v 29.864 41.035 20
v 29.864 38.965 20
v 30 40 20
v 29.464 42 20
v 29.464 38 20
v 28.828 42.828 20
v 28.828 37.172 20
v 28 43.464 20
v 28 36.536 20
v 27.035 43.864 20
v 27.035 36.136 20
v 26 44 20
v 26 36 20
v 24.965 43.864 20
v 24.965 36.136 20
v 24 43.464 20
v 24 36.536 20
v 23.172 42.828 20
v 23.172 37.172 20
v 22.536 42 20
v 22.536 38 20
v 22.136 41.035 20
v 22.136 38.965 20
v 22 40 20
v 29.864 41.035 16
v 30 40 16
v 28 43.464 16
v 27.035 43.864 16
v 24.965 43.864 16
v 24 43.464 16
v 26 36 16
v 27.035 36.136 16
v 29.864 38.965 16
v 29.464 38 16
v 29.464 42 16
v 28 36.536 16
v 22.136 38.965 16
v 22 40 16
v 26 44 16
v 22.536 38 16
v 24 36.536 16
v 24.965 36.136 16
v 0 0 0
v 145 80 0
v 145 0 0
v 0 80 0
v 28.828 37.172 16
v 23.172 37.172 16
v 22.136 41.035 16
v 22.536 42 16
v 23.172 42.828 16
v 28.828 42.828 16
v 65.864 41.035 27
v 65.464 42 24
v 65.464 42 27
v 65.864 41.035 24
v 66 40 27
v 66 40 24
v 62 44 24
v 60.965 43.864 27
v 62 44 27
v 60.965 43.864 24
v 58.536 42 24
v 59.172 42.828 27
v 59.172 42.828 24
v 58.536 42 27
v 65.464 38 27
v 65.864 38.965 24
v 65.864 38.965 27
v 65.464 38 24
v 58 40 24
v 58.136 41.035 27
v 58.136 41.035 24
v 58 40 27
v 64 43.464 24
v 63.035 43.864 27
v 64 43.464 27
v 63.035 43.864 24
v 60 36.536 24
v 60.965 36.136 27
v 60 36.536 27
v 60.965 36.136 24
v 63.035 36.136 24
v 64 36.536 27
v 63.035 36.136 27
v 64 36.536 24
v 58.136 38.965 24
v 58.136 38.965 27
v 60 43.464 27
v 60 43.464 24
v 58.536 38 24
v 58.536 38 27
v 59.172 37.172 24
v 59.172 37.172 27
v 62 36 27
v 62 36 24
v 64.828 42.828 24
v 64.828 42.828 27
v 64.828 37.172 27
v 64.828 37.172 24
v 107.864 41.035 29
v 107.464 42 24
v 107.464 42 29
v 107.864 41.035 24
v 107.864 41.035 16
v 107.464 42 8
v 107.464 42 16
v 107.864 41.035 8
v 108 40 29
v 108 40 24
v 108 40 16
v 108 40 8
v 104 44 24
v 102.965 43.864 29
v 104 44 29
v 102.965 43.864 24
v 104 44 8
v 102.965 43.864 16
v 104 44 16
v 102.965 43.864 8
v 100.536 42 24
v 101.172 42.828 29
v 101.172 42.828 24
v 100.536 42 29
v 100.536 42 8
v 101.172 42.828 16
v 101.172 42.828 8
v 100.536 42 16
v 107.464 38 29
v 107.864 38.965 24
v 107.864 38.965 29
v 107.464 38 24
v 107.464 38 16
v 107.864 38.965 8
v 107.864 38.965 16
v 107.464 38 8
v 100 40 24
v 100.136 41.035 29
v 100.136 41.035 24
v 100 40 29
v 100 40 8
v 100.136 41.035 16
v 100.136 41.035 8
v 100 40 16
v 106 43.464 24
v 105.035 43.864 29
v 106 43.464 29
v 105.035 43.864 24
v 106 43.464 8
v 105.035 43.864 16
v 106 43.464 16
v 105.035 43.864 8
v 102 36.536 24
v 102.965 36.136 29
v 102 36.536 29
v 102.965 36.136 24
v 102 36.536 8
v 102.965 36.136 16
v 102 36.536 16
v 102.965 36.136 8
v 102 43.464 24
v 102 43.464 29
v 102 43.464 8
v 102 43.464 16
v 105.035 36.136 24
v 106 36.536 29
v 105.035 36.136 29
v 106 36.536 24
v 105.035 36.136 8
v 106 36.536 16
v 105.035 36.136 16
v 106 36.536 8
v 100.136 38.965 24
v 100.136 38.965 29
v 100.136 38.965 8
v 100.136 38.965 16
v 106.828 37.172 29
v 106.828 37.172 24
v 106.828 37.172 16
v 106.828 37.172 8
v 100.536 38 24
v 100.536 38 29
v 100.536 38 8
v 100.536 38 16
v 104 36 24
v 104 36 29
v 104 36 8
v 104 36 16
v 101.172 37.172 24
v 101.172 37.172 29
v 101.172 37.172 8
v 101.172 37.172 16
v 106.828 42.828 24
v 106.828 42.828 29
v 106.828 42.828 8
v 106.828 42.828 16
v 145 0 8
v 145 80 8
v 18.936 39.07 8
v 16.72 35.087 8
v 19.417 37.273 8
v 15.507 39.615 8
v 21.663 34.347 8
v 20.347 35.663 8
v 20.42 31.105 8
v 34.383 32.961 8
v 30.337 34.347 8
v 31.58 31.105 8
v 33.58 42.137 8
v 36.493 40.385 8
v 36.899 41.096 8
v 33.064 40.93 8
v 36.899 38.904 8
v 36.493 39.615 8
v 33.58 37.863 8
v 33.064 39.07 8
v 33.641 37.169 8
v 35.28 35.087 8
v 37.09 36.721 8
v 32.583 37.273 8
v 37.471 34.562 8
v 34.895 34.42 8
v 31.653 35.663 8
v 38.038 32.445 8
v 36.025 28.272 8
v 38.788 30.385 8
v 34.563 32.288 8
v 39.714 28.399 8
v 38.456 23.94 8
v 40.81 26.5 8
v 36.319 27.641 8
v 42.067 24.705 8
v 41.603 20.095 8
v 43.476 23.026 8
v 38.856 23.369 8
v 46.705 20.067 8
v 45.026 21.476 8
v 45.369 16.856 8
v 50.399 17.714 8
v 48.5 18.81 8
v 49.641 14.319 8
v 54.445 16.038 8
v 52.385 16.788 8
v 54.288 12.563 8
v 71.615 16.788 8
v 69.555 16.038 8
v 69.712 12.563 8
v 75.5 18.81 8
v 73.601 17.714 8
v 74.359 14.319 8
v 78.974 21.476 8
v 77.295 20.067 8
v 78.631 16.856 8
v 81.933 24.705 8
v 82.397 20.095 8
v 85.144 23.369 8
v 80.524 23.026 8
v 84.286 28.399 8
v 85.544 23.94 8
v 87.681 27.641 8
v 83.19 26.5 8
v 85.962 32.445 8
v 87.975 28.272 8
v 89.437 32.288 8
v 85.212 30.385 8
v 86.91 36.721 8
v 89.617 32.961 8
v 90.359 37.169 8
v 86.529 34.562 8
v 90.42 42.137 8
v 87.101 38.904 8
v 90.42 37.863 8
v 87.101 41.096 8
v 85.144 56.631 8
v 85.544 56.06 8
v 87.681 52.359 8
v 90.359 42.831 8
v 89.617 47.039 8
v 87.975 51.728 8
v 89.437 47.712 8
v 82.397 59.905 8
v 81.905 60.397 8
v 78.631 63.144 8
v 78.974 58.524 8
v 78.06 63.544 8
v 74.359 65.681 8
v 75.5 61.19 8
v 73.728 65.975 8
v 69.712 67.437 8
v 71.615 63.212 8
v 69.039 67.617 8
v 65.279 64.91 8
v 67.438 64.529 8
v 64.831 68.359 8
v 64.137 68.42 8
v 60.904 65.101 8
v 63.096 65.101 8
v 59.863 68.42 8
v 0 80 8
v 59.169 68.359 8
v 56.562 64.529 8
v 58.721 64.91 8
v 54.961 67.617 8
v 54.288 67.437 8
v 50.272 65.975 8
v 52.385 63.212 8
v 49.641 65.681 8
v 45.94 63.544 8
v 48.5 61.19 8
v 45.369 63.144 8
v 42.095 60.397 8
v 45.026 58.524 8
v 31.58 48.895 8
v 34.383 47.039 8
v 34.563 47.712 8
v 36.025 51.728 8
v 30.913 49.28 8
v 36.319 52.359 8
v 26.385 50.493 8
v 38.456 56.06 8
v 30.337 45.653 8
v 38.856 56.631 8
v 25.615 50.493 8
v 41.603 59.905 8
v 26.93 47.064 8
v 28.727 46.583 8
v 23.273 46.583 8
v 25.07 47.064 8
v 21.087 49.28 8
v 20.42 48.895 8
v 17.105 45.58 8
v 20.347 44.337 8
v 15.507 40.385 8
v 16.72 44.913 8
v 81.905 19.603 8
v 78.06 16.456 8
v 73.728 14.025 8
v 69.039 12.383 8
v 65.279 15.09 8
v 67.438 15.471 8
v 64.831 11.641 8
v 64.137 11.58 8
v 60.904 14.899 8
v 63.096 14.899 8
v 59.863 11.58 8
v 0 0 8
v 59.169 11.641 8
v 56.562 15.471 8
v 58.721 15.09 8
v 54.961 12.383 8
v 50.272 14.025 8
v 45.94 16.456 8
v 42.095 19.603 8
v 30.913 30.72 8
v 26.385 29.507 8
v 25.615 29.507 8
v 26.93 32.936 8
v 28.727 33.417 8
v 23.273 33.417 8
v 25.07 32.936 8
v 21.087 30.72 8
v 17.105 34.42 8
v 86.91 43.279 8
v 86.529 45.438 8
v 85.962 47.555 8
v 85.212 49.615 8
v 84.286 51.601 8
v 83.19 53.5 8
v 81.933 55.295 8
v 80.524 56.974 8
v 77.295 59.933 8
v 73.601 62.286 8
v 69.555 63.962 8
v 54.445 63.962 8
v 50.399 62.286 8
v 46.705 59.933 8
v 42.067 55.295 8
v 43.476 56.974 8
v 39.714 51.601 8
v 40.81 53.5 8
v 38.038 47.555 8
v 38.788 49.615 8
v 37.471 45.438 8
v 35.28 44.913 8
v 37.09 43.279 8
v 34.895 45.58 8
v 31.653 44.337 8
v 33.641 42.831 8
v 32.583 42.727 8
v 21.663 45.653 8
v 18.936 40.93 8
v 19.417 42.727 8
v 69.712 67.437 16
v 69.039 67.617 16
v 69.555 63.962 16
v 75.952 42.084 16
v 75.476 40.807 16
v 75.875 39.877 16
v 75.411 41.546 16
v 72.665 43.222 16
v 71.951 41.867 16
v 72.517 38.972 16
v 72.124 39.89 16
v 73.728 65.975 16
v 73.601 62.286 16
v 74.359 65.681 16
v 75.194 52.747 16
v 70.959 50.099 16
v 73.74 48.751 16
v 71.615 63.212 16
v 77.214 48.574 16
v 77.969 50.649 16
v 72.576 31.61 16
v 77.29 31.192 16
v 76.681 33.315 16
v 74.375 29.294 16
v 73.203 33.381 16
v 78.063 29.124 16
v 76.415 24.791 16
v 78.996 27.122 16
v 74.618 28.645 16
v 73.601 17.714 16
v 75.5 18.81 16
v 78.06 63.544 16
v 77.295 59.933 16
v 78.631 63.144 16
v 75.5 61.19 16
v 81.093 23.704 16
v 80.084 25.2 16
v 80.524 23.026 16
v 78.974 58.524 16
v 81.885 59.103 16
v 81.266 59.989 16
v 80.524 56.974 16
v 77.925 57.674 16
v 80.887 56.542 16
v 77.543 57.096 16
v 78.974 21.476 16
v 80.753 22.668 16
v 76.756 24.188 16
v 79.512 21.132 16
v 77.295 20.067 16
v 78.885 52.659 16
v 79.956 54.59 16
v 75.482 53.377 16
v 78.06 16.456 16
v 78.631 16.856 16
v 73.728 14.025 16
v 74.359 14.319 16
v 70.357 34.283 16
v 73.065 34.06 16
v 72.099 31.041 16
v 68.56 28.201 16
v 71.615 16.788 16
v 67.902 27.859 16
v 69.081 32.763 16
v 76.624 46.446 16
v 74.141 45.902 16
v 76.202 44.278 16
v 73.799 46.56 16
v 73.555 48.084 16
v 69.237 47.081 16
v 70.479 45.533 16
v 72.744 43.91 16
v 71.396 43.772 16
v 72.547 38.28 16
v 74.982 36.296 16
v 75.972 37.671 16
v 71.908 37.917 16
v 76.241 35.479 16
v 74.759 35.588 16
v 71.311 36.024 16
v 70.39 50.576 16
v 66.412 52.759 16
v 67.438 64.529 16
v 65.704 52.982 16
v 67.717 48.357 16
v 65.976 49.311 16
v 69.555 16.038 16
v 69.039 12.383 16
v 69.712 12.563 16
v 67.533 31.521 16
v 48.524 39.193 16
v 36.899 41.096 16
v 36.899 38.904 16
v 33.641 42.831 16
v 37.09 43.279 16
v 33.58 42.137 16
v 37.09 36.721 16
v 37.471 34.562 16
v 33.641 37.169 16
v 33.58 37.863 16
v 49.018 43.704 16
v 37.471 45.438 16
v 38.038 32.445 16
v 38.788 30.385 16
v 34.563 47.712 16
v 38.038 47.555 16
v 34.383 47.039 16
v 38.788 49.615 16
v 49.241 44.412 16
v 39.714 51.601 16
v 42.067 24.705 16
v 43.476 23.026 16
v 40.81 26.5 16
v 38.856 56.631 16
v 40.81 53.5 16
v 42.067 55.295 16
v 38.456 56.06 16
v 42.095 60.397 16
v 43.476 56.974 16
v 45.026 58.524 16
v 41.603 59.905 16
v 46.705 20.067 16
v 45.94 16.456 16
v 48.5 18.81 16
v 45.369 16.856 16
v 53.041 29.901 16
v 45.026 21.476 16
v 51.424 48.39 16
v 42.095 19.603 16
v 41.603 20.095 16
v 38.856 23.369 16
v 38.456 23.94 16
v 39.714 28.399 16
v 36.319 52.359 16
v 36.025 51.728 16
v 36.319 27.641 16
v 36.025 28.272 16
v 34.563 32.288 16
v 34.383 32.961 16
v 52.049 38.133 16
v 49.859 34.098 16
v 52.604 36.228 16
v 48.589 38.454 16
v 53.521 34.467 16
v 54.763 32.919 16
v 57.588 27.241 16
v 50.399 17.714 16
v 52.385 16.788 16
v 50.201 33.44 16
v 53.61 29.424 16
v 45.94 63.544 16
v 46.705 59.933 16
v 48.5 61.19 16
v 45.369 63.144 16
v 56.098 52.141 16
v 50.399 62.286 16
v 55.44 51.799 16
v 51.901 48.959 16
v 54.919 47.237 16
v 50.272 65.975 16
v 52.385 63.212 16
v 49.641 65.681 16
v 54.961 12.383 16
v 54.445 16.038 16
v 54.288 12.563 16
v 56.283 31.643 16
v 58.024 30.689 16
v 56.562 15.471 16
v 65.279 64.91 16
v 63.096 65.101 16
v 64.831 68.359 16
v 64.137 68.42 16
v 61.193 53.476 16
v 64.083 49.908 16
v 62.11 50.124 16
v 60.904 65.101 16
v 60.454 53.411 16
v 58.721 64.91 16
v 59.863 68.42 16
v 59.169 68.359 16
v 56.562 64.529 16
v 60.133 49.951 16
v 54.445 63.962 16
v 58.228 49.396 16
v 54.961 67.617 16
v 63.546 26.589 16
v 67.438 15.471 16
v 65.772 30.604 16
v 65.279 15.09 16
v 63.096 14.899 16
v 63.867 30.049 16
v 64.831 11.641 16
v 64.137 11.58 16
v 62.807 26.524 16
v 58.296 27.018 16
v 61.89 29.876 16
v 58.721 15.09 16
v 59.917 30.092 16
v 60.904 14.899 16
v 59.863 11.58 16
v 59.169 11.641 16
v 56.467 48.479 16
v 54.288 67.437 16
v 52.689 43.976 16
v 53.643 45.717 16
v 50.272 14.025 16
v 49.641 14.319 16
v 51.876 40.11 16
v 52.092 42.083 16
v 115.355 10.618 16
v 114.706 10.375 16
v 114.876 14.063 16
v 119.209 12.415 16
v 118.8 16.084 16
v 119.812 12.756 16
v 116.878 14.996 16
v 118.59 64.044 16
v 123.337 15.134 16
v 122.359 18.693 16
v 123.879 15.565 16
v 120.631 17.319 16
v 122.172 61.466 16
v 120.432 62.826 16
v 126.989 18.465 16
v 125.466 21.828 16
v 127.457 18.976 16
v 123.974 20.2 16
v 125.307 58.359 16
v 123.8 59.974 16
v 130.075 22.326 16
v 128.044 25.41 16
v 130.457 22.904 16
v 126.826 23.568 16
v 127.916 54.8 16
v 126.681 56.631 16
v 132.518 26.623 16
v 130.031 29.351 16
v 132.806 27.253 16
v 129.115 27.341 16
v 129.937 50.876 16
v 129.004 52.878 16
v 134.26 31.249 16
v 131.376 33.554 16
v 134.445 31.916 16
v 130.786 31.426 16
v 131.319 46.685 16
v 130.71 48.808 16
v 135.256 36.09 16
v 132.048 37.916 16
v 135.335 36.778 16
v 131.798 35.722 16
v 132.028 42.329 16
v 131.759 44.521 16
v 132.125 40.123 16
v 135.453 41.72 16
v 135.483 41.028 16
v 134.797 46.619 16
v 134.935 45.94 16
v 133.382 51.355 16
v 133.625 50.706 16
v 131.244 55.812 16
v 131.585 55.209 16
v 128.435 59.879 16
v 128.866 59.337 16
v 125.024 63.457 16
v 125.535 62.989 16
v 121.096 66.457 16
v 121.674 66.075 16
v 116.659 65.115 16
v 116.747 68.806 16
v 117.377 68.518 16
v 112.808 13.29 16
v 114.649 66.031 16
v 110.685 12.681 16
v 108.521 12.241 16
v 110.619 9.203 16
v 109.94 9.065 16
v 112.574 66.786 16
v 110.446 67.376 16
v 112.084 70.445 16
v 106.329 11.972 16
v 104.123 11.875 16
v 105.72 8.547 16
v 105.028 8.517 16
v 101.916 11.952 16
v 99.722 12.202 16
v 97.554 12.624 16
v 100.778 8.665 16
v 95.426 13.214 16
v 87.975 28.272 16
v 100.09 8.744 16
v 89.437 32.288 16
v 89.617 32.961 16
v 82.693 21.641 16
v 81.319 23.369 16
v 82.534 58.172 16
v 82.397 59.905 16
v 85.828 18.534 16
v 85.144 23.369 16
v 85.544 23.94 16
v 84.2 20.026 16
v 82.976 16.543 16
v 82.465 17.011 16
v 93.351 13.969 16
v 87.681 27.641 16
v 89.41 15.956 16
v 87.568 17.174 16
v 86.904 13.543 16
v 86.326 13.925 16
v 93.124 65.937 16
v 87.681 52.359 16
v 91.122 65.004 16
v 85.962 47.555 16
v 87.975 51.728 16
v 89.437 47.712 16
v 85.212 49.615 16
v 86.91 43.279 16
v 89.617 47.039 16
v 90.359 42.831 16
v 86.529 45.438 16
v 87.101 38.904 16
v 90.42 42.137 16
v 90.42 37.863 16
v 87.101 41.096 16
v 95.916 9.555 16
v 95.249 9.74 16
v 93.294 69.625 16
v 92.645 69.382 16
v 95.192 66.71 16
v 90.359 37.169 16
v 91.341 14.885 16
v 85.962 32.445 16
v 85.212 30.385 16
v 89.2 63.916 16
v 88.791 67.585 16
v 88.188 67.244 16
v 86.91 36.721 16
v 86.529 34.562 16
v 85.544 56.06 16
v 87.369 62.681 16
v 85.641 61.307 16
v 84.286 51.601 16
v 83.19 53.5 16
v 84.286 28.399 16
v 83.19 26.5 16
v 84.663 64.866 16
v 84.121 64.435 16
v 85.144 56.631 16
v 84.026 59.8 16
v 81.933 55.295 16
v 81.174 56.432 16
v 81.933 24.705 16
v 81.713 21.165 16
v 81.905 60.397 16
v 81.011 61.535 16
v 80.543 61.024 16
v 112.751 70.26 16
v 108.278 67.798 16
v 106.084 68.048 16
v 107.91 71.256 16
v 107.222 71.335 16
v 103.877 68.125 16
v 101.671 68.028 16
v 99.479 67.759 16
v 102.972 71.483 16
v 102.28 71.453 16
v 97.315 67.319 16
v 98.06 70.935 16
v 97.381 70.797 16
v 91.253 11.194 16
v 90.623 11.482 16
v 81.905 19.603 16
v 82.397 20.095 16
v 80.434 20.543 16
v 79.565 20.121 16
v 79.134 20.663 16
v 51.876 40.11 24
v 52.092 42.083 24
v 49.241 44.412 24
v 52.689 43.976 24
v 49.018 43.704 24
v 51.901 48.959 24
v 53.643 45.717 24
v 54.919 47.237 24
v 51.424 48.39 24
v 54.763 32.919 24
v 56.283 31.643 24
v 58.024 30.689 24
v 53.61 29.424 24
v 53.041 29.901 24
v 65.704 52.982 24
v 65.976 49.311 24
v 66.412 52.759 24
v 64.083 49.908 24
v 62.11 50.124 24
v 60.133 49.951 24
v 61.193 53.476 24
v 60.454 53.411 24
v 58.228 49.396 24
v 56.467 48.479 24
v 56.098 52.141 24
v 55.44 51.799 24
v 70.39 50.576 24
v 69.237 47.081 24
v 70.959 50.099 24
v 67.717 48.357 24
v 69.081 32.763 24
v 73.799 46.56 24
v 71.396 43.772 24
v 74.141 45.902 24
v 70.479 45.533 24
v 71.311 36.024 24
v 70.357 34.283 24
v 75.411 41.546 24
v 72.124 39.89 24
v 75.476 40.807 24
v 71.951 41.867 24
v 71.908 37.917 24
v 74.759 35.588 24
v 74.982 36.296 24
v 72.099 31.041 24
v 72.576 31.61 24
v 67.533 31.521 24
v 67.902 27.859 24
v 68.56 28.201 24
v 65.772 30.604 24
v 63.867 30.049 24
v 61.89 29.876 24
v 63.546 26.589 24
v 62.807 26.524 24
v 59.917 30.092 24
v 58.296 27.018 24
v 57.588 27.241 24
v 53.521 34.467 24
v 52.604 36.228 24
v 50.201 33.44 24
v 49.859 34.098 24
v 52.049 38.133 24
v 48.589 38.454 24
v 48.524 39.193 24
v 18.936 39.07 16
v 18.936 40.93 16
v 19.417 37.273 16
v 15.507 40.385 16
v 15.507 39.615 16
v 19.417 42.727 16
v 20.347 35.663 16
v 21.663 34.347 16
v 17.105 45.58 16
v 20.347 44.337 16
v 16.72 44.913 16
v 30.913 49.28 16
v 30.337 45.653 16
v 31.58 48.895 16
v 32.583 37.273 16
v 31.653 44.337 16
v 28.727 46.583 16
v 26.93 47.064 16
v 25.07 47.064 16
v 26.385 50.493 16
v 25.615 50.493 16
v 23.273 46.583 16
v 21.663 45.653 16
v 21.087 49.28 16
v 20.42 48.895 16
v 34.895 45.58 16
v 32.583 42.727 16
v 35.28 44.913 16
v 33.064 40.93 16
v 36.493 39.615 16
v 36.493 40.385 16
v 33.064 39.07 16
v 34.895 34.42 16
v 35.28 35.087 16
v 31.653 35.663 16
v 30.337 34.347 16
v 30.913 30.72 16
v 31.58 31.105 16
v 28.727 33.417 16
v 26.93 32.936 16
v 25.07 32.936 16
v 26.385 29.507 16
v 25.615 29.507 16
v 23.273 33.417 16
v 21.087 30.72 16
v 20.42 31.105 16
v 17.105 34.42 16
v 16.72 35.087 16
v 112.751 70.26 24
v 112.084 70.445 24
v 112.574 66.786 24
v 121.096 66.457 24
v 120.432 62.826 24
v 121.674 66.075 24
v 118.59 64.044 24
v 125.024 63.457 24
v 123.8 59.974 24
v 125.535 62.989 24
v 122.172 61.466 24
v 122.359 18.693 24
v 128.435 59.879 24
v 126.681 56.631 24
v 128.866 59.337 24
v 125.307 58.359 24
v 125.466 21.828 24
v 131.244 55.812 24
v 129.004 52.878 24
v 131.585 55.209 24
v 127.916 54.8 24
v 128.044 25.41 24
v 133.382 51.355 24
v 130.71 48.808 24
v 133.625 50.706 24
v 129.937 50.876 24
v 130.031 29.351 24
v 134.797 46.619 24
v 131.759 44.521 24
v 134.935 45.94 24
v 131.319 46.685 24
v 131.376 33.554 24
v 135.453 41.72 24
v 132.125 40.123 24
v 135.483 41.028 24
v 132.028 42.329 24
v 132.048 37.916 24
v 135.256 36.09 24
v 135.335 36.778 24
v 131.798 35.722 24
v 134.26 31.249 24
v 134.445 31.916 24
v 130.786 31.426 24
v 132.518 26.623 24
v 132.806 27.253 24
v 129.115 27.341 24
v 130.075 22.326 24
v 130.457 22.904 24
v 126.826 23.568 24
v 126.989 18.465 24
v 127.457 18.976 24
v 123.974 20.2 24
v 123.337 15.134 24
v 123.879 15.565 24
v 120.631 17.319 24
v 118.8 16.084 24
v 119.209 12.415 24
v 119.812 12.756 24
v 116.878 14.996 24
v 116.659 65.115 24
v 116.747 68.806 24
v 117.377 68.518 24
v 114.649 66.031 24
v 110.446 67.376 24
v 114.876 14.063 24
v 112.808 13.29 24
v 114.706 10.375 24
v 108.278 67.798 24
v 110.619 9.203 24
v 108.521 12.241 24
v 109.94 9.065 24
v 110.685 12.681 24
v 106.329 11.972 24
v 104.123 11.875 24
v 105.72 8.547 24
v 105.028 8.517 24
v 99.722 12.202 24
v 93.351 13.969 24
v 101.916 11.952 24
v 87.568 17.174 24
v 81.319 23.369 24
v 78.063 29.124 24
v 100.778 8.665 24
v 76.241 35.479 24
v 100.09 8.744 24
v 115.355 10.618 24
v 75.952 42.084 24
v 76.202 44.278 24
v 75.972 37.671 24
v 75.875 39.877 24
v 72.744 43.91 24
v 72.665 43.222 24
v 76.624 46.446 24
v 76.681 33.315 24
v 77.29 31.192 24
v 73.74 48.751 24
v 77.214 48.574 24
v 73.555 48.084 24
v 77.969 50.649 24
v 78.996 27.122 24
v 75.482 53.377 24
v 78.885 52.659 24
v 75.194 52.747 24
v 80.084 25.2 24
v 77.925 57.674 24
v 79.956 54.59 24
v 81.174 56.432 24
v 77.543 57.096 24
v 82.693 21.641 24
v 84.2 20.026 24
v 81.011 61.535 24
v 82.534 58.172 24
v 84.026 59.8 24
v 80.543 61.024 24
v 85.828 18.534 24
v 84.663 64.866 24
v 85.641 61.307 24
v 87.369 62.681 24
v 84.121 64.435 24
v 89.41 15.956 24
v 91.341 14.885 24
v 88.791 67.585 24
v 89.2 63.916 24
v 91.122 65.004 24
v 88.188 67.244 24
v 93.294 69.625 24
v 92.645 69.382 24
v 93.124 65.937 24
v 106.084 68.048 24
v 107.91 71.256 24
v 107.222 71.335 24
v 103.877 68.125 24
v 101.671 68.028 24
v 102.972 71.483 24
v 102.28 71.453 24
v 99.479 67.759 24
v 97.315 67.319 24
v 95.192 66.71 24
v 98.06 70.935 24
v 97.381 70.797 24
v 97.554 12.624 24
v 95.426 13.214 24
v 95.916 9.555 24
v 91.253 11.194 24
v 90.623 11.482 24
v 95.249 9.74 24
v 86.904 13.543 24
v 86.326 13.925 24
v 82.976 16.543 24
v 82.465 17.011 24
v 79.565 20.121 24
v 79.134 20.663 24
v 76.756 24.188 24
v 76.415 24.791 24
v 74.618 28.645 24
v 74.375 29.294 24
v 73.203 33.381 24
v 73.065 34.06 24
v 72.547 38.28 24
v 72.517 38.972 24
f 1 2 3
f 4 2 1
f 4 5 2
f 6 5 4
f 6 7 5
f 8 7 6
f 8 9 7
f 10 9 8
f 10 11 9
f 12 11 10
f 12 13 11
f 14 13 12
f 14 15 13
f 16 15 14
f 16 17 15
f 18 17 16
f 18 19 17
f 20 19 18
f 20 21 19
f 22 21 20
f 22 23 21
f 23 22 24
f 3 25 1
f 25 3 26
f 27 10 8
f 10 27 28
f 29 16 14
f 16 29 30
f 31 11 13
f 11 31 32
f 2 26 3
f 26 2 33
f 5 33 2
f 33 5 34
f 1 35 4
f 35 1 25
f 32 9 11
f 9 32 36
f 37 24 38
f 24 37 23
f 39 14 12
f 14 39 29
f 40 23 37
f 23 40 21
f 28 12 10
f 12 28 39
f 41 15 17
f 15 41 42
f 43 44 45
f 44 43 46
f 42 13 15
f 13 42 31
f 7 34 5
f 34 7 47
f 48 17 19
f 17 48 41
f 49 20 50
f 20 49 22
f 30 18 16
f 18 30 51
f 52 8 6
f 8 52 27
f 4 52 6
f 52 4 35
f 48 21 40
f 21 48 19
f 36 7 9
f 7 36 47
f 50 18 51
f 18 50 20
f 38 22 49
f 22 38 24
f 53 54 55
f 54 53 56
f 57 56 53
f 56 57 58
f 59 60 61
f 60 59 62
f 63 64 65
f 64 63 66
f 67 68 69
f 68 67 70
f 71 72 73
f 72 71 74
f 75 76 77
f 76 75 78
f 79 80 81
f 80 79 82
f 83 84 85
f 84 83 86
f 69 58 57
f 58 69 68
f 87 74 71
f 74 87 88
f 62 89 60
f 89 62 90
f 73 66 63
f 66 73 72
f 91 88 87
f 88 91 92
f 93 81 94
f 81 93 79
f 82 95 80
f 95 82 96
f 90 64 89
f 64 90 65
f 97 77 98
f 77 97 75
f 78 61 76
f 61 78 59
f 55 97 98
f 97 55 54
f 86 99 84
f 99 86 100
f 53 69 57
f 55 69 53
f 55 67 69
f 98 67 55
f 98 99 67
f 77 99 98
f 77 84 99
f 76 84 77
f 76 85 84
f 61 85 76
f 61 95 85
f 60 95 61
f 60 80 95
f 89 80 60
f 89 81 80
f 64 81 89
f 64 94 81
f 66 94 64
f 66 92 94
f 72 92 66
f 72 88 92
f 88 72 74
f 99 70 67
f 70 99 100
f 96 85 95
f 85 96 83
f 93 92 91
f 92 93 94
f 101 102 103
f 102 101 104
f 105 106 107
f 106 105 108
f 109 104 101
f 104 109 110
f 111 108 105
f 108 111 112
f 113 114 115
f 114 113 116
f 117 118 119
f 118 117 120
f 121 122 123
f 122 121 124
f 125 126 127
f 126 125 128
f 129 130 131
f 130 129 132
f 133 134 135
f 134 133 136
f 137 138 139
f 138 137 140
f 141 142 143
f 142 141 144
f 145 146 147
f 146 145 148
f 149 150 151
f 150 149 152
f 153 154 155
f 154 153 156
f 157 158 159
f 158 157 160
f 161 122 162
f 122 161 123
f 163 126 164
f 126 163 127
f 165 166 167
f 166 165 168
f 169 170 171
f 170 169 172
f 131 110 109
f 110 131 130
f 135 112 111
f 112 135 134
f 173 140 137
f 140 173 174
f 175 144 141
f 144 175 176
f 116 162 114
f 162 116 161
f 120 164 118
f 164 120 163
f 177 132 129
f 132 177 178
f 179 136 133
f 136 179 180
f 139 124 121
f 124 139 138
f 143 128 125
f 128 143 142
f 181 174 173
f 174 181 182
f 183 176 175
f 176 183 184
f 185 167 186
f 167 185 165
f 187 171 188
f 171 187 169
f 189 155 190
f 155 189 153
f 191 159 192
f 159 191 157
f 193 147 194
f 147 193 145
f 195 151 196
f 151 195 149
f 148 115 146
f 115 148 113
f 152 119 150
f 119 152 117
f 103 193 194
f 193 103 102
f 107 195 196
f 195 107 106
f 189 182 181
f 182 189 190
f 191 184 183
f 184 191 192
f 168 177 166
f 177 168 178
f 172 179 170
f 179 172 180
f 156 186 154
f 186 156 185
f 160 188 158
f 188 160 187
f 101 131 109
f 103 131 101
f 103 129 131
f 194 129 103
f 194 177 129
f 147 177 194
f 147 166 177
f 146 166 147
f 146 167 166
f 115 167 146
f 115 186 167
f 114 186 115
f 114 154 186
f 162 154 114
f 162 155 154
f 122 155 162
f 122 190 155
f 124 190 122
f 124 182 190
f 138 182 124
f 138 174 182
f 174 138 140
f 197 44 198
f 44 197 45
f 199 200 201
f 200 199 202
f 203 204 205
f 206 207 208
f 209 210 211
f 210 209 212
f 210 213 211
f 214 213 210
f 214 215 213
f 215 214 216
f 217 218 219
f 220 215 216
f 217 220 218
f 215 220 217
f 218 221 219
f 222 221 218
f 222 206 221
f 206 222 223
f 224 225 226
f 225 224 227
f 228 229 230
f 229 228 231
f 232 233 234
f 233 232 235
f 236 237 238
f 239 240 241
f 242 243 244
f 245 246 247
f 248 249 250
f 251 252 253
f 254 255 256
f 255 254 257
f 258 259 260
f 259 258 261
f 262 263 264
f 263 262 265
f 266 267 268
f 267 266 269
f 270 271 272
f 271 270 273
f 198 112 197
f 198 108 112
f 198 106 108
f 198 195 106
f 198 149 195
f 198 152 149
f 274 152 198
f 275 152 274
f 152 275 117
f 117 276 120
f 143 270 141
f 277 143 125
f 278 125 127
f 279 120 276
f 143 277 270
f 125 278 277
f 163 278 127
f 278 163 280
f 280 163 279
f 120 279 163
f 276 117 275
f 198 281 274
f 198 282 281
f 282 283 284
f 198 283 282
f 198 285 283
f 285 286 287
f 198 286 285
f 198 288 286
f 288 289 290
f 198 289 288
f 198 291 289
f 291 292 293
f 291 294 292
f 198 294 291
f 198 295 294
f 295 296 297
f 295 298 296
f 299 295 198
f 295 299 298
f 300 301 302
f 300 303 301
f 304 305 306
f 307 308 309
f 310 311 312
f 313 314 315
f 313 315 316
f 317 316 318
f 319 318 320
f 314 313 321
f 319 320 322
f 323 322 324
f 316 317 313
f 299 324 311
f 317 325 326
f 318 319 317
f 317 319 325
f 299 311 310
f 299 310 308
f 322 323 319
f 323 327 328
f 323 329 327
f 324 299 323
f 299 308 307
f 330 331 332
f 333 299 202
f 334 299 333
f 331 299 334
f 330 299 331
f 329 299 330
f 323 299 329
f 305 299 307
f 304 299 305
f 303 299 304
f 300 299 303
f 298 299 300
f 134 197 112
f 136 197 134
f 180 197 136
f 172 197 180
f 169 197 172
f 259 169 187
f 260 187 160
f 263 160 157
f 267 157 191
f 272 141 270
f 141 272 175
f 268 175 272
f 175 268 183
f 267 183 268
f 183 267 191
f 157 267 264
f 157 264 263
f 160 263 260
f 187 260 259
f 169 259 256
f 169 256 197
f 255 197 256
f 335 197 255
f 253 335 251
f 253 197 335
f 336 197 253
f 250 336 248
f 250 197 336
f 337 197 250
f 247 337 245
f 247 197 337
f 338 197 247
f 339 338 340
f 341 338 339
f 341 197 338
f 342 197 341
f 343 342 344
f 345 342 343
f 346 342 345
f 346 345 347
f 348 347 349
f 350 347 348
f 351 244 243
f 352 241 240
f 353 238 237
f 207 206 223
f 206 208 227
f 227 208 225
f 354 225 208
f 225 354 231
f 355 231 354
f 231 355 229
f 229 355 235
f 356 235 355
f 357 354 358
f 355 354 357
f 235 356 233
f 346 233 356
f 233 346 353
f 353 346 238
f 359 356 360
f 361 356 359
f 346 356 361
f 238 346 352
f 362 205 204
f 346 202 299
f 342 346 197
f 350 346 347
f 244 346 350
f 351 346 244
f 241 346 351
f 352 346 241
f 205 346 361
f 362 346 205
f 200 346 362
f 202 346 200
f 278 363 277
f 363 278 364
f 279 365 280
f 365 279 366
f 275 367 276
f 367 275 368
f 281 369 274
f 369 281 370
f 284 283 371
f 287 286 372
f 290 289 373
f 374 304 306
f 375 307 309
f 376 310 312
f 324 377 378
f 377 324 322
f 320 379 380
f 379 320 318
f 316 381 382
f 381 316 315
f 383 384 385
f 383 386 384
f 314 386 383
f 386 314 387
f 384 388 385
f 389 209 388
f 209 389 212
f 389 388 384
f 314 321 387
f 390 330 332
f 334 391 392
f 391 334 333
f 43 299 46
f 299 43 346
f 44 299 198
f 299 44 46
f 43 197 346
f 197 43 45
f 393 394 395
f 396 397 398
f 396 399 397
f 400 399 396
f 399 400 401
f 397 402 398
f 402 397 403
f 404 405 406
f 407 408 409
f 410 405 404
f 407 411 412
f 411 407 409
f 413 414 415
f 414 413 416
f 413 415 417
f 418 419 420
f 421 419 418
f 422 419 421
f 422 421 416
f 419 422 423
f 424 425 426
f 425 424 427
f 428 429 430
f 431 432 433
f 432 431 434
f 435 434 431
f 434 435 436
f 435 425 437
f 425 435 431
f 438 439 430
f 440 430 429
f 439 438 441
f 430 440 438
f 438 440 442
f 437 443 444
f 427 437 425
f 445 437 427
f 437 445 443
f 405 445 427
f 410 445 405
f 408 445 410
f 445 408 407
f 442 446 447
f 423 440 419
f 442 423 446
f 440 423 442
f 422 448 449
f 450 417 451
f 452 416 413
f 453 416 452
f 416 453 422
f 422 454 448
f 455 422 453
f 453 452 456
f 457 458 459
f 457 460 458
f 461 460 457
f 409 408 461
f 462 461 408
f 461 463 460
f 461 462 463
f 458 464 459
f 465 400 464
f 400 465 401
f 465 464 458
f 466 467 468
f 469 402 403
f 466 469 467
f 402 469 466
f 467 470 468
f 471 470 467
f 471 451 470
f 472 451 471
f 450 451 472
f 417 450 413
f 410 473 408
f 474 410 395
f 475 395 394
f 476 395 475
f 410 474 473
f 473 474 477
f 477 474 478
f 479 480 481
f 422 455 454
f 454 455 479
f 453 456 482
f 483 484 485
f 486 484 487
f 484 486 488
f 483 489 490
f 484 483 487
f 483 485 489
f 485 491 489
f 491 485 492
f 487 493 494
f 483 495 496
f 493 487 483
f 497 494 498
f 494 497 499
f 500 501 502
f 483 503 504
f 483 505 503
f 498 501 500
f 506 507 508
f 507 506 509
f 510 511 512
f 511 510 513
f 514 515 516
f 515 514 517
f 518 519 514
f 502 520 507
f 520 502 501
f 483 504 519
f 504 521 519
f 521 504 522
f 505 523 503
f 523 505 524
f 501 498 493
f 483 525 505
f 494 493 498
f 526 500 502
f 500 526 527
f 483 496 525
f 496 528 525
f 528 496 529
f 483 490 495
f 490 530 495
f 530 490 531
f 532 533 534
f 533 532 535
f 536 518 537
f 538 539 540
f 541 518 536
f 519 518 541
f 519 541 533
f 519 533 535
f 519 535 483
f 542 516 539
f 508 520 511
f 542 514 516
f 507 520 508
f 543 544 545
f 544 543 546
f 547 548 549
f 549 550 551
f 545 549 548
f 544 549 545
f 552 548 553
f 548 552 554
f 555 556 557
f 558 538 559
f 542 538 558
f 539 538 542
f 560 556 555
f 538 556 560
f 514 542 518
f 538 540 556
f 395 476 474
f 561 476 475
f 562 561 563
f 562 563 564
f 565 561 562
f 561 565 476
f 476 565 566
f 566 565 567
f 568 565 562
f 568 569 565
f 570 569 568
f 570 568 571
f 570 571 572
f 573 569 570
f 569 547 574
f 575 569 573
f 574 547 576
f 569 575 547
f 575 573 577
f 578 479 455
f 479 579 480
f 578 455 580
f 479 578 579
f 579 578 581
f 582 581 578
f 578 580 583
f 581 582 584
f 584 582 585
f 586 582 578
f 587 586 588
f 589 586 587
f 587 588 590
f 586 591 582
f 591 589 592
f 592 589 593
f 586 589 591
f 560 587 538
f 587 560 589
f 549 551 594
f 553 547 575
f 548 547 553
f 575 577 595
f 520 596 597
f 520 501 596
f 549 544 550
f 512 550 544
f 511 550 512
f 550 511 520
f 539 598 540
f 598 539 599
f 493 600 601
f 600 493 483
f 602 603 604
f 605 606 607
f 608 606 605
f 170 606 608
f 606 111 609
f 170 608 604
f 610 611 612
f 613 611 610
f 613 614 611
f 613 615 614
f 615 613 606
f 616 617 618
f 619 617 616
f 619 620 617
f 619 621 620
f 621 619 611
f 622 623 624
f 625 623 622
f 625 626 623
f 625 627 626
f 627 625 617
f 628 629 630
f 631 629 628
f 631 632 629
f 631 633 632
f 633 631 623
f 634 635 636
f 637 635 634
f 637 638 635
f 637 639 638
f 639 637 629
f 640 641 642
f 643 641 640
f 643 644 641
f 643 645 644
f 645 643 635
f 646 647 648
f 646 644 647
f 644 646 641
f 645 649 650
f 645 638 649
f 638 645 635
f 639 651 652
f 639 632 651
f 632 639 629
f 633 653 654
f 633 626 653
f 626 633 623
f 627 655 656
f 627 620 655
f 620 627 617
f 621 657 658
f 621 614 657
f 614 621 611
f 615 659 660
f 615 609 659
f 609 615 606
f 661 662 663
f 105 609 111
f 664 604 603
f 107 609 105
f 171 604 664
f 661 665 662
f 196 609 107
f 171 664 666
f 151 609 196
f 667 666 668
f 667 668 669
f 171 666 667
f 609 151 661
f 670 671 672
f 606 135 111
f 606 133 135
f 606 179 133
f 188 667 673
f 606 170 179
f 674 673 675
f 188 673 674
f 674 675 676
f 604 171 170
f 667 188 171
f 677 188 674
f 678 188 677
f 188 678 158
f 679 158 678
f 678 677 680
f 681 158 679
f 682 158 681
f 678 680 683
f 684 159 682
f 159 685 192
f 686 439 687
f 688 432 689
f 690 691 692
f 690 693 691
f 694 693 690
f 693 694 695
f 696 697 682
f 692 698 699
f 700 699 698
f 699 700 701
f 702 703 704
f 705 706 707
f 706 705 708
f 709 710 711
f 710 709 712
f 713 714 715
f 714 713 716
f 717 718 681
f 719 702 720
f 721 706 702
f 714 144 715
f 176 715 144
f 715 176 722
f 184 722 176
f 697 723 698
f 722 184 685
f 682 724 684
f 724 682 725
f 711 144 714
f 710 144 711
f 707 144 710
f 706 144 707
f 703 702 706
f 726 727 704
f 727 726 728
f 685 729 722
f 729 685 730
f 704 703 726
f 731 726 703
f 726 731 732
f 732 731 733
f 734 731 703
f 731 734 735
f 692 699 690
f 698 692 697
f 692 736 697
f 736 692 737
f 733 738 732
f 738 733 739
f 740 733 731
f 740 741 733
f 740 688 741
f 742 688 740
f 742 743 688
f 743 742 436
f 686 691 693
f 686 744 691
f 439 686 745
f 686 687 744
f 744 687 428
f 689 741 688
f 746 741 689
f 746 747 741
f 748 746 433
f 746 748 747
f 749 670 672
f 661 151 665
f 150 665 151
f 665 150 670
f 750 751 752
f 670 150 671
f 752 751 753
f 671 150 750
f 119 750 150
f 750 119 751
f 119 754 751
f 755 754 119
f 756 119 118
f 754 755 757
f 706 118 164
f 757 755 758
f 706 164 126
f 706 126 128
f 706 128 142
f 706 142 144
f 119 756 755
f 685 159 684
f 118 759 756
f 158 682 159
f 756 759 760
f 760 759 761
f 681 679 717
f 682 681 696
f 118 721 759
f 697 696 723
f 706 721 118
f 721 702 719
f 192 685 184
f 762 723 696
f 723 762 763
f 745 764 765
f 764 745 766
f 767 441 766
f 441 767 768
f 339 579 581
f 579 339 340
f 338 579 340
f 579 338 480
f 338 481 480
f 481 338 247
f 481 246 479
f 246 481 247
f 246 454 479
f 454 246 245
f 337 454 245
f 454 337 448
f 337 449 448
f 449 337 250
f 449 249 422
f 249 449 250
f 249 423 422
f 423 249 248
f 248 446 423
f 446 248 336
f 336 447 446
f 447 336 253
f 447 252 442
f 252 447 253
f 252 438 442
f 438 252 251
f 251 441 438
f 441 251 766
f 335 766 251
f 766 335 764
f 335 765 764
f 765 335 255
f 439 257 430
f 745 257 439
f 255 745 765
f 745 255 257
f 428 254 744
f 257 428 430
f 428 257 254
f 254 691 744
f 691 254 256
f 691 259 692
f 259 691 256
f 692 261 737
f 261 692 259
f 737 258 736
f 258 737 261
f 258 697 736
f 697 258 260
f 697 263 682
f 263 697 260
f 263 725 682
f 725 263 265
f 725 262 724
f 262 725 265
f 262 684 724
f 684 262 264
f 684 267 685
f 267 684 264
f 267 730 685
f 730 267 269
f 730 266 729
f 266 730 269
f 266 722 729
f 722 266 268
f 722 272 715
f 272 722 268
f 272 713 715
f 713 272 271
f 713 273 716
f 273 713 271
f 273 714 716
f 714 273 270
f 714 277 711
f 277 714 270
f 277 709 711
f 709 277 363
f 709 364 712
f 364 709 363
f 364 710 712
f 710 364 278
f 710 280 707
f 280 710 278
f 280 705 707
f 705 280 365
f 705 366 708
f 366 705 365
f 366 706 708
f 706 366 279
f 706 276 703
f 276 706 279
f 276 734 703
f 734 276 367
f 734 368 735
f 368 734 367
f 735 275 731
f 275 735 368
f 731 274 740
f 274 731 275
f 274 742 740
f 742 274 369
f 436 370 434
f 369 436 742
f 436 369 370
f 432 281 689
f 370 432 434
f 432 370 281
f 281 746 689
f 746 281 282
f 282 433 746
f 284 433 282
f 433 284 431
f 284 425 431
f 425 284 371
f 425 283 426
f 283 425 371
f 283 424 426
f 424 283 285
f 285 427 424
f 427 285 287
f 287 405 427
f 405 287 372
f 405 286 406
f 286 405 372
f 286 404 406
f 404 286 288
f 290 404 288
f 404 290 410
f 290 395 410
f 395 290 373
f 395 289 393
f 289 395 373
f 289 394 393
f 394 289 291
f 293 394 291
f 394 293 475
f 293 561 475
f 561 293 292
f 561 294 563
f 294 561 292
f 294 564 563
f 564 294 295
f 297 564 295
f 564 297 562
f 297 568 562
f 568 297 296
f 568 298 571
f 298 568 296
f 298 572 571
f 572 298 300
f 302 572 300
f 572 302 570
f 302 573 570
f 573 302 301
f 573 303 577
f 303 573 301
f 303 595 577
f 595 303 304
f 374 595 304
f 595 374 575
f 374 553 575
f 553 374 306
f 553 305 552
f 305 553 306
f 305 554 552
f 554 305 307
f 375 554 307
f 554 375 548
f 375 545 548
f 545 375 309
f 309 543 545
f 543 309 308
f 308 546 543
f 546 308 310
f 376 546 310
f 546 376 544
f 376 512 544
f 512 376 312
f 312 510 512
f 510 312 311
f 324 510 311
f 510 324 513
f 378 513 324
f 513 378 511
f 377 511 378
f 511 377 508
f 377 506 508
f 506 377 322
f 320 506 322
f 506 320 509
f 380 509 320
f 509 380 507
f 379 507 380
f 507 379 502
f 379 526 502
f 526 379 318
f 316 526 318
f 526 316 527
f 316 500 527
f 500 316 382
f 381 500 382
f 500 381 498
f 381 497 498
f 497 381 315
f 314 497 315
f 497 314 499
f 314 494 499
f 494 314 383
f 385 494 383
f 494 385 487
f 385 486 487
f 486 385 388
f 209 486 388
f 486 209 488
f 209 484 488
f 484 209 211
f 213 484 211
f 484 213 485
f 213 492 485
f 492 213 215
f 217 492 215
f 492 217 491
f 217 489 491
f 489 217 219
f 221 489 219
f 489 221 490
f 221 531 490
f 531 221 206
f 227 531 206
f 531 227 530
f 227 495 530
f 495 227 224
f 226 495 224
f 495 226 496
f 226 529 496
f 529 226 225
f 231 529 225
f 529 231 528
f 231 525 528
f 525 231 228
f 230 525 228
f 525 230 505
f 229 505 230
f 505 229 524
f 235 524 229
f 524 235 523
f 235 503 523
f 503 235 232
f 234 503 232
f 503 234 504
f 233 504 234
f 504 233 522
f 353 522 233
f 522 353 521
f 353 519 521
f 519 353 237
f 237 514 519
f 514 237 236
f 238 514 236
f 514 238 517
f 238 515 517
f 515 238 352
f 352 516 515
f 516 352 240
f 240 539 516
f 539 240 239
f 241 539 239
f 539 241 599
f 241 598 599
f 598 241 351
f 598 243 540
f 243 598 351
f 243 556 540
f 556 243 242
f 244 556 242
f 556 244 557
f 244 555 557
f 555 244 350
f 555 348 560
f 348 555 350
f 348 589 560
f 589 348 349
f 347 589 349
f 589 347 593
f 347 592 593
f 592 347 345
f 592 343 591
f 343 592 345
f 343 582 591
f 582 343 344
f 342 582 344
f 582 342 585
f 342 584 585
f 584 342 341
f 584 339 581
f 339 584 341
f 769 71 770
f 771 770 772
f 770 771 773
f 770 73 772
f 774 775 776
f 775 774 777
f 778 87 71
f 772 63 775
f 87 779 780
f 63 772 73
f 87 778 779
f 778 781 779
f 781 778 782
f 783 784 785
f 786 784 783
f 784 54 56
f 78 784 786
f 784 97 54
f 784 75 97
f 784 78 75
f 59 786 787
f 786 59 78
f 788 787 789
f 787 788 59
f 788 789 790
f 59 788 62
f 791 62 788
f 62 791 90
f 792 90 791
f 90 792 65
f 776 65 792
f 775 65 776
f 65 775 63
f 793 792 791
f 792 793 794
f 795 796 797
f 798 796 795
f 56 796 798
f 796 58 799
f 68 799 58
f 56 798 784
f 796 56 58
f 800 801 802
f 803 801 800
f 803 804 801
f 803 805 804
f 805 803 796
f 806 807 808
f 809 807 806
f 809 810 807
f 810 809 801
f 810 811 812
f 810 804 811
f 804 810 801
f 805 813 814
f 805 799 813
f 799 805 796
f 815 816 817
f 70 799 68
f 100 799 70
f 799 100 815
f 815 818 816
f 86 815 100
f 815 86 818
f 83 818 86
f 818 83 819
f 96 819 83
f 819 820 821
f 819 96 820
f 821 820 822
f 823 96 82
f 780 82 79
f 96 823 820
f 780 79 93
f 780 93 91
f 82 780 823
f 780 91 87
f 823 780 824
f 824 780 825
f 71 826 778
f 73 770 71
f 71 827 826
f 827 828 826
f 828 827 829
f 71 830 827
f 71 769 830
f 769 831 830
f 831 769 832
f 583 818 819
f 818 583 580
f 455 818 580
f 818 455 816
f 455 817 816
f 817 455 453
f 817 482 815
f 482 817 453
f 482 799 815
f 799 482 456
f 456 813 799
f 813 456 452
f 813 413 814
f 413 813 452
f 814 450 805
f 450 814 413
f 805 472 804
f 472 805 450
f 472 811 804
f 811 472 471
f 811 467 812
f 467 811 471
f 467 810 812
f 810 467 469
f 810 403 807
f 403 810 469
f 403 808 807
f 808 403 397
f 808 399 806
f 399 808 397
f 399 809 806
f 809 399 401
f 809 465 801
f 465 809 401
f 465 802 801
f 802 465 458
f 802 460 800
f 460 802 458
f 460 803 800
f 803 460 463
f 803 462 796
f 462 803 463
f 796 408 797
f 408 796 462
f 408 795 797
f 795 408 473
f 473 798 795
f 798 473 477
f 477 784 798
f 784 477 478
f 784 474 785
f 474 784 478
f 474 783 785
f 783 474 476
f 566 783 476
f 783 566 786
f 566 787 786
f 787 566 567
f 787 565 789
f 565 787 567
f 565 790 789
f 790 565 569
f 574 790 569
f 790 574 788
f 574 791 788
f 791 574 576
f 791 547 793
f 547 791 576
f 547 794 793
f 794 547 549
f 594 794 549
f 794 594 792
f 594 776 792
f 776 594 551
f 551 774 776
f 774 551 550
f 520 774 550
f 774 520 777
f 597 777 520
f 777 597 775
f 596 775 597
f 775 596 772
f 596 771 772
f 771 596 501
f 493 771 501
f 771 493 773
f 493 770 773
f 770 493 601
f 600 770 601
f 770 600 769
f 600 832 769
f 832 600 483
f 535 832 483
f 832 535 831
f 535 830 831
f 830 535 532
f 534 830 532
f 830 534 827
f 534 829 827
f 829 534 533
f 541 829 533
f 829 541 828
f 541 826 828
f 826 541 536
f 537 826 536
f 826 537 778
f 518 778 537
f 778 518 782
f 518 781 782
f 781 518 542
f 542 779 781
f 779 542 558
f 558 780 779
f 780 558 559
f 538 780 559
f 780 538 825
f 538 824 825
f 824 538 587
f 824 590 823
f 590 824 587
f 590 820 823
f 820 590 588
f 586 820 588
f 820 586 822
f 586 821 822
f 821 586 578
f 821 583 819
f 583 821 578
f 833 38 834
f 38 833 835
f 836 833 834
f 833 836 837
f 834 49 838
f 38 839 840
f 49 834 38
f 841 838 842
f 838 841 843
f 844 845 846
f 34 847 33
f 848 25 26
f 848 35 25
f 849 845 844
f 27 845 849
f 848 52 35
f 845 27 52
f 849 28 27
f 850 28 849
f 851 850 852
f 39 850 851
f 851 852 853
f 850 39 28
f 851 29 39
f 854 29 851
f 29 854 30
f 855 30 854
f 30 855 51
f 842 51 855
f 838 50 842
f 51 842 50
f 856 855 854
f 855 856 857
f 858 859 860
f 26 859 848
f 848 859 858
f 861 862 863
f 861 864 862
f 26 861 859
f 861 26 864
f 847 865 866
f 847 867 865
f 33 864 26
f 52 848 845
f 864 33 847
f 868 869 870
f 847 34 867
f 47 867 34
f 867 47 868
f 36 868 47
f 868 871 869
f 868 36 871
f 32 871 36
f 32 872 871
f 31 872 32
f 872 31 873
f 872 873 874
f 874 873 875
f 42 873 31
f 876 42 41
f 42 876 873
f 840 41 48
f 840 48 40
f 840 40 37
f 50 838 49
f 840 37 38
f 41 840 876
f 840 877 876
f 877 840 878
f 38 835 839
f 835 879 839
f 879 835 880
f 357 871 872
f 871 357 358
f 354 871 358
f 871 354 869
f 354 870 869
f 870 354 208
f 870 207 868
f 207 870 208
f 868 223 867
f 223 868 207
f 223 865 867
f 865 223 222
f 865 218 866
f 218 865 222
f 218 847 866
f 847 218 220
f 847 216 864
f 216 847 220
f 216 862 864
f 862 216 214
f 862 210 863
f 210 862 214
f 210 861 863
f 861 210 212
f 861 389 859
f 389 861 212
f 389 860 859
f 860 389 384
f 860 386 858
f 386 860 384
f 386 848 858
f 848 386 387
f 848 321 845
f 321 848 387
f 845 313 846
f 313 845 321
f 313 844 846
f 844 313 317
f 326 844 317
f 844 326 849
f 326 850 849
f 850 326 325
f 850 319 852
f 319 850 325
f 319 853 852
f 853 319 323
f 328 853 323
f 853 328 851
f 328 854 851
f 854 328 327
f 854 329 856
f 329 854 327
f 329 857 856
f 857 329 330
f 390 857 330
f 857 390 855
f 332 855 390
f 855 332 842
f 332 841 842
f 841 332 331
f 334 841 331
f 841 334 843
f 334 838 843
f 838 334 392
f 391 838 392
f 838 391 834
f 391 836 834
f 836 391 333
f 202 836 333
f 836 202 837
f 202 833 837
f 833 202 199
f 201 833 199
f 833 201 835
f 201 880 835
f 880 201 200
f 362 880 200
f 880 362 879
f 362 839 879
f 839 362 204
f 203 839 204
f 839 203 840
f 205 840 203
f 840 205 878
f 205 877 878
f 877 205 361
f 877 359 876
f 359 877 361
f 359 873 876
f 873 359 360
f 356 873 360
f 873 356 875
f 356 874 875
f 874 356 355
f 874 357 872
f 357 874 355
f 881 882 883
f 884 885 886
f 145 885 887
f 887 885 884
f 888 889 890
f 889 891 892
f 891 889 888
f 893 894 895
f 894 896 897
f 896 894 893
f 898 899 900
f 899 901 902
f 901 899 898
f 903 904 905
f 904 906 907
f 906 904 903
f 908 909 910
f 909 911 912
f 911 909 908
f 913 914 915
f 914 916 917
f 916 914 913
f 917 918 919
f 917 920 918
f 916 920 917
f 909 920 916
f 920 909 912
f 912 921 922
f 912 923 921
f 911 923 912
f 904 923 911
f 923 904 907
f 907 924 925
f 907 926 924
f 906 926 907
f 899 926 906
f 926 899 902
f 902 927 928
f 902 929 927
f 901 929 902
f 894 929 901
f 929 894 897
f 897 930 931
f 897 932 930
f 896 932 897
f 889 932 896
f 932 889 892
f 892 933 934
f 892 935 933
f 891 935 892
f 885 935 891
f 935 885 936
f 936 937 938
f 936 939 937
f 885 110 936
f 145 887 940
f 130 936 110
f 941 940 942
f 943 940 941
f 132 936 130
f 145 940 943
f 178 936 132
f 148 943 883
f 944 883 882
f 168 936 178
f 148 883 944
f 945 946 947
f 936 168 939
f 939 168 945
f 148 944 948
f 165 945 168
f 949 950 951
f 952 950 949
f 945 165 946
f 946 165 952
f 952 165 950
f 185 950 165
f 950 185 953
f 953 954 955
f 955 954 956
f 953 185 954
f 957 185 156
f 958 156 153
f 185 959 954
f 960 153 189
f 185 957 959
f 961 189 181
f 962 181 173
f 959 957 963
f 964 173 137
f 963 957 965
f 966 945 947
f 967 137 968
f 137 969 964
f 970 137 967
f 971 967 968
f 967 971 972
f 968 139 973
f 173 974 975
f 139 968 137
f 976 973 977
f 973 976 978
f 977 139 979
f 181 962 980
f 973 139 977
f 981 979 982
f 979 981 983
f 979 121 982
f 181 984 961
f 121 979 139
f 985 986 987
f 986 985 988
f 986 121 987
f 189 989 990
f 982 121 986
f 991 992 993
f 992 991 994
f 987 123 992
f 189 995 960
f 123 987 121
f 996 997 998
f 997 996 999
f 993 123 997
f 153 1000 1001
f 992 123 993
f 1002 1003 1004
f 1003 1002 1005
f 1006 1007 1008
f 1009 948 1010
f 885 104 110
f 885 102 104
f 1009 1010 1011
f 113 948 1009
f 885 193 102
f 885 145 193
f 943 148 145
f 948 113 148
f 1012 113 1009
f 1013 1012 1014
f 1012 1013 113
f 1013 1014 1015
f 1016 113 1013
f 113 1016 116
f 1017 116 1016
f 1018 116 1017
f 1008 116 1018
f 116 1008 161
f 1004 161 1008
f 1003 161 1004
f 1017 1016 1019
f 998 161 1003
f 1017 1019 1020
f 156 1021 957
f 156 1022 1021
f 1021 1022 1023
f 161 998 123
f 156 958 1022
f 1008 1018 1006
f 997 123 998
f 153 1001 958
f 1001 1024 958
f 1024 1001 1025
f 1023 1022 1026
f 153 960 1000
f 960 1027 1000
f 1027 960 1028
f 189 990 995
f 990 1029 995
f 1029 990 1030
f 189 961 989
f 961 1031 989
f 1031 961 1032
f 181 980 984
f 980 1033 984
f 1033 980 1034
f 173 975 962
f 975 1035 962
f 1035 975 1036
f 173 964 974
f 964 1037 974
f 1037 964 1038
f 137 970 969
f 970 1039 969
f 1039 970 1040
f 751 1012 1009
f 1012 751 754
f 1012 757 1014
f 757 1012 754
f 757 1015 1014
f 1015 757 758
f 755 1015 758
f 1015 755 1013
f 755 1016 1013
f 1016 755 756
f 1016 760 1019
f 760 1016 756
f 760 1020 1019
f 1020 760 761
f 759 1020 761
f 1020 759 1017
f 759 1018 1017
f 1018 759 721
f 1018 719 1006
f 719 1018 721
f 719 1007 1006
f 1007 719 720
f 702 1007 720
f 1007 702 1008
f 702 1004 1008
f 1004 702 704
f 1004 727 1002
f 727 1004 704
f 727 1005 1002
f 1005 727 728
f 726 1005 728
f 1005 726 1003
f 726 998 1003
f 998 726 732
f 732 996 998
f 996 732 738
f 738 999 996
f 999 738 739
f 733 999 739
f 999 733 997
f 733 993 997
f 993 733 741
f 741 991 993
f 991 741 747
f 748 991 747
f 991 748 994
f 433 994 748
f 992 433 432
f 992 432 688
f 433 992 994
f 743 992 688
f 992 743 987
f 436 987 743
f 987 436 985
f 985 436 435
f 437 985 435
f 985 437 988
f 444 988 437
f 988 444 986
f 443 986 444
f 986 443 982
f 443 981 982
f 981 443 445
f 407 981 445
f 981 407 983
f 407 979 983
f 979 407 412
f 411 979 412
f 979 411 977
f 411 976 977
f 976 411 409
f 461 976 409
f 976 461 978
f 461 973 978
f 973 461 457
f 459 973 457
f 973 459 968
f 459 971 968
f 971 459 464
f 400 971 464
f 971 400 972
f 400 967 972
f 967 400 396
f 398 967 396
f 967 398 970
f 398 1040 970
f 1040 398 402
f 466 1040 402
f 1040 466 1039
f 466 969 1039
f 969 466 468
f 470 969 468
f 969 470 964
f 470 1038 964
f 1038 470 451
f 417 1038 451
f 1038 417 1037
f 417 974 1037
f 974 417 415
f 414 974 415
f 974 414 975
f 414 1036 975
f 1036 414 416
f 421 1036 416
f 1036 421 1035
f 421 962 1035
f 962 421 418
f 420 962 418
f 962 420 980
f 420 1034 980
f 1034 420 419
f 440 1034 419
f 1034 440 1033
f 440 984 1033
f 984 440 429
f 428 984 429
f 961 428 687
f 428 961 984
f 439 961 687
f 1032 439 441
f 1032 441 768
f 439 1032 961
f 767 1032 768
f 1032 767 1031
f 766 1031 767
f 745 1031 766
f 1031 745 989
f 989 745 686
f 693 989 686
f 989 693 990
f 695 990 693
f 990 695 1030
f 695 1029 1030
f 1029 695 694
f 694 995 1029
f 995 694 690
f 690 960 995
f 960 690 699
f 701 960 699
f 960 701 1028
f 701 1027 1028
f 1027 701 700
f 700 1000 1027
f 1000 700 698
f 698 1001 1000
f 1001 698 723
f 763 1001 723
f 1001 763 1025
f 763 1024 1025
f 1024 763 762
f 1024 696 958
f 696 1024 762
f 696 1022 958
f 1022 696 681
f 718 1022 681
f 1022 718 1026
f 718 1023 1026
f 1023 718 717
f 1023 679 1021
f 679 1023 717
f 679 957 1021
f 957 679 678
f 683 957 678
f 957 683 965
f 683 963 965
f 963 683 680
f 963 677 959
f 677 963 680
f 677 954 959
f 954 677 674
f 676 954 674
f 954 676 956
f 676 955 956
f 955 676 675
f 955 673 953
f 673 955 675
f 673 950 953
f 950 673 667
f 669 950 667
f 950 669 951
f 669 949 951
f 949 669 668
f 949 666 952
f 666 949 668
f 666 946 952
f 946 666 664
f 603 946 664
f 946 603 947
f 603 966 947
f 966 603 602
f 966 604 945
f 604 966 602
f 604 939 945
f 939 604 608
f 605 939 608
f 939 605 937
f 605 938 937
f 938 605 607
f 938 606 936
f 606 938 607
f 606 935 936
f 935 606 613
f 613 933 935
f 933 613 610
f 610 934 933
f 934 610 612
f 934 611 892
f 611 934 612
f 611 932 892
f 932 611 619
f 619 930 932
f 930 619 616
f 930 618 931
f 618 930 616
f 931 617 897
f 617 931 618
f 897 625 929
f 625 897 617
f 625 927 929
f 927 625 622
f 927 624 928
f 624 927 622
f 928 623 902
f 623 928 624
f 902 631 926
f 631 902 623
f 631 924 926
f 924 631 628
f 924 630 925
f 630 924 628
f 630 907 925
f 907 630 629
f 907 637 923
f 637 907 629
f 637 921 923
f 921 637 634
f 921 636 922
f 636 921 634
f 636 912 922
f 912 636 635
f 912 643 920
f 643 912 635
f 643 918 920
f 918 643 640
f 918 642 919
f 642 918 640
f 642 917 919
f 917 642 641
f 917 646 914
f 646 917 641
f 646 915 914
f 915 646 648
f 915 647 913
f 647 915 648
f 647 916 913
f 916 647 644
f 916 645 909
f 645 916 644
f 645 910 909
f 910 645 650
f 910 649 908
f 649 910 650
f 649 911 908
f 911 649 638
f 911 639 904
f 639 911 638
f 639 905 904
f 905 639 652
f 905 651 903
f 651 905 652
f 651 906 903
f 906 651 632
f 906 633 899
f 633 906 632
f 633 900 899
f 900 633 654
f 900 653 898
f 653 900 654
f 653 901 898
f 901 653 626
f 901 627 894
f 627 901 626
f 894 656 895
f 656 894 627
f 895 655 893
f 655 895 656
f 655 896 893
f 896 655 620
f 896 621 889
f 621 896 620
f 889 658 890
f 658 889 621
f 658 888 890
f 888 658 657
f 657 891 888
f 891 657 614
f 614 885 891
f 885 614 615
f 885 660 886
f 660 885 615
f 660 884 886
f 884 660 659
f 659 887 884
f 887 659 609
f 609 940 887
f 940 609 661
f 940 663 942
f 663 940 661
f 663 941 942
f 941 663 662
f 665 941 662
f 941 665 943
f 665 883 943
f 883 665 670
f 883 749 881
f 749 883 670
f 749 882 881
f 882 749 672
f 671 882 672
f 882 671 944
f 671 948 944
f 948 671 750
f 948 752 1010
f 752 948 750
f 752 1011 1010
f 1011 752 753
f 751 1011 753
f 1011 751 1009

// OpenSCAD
// A compound gear train — 7.5 turns of the motor per turn of the output.
//
// A gear() constrains a *rate*, not a place, so every shaft still needs the
// hinge that holds it: the gear says how two shafts are related, the hinges say
// where they are. Stacking two gears on one shaft is what makes a train
// compound — the middle part carries both, so the second stage starts from the
// first stage's output rather than from the input again.
//
// The teeth are real, and they have to be: a gear train drawn as three plain
// discs turning near each other is not a picture of a gear train. They are also
// free. A tooth profile is a *polygon*, and extruding one costs no boolean at
// all — where drilling four lightening holes through each of these wheels cost
// 33 ms a wheel natively and two minutes in a browser.
//
// Two things make teeth mesh rather than merely coexist. Every gear here shares
// one module — the tooth size — which is what fixes each pitch radius at M·n/2
// and each centre distance at the sum of two of them. And each gear is *phased*
// so a tooth of one arrives at a gap of the other: PH_C and PH_OUT below are
// derived from that requirement rather than dialled in by eye.
//
// The teeth overlap in the annulus between the two pitch circles, as meshing
// teeth must, and nothing objects: a gear() is a mate, and two parts a mate
// joins do not also collide.

module part(name, fixed = false, density = undef, mass = undef,
            collider = undef, friction = undef, bounce = undef) { children(); }
module hinge(name, parts, at, axis, range) { }
module gear(name, parts, at, axis, ratio) { }
module drive(name, to, over, at, torque, speed) { }

STEEL = 0.0078;     // g/mm³
DECK  = 8;
M     = 1.5;        // module — the one number every gear here has in common

N_IN = 12; N_BIG = 36; N_SMALL = 16; N_OUT = 40;
function pitch_r(n) = M * n / 2;          // 9, 27, 12 and 30

// Shafts, at the only spacings that mesh: the sum of the two pitch radii.
A = [26, 40, DECK];
B = [A[0] + pitch_r(N_IN) + pitch_r(N_BIG), 40, DECK];
C = [B[0] + pitch_r(N_SMALL) + pitch_r(N_OUT), 40, DECK];

// One tooth is four points: out to the tip, across it, and back down to the
// root. Tooth centres land on multiples of the pitch angle, so an unphased gear
// has a tooth pointing along +x.
function gear_2d(n) =
    let (p = 360 / n, r = pitch_r(n), tip = r + M, root = r - 1.25 * M)
    [for (i = [0 : n - 1]) each [
        [root * cos((i - 0.25) * p), root * sin((i - 0.25) * p)],
        [tip  * cos((i - 0.07) * p), tip  * sin((i - 0.07) * p)],
        [tip  * cos((i + 0.07) * p), tip  * sin((i + 0.07) * p)],
        [root * cos((i + 0.25) * p), root * sin((i + 0.25) * p)],
    ]];

module wheel(n, h, phase = 0) {
    rotate([0, 0, phase])
        linear_extrude(height = h)
            polygon(points = gear_2d(n));
}

// The input arrives at the line of centres with a tooth, so the compound has to
// meet it with a gap: half a pitch round.
PH_C = 180 / N_BIG;
// The compound's small gear is carried round by that same phase, so the output
// has to allow for it — converted to the output's own angular scale, since the
// two turn through different angles for the same arc — and then offset half a
// pitch again to put its gap where that tooth will arrive.
PH_OUT = 180 - PH_C * N_SMALL / N_OUT - 180 / N_OUT;

// The deck, and the three shafts standing on it.
//
// A hinge() says a wheel turns about a line. It does not put anything on that
// line, and a gear train whose wheels are threaded on nothing is a row of discs
// hanging in the air at the height they were drawn. Worse, the one place it
// shows is the one place a mate hides: a wheel is mated to the frame, so the
// pair is excluded from both the collision solver and the interference check,
// and all three agree that a wheel supported by nothing is fine.
//
// Each shaft is thinner than the root circle of every wheel on it — 4 against
// 7.1 at the worst, the little input pinion — so there is metal all the way
// round the bore, and clear of the wheel meshing with it: the big wheel's teeth
// reach to within 3.5 of the input's shaft.
SHAFT = 4;
part("frame", fixed = true)
    color("slategray") {
        cube([145, 80, DECK]);
        color("dimgray") {
            translate([A[0], A[1], 0]) cylinder(h = 20, r = SHAFT, $fn = 24);
            translate([B[0], B[1], 0]) cylinder(h = 27, r = SHAFT, $fn = 24);
            translate([C[0], C[1], 0]) cylinder(h = 29, r = SHAFT, $fn = 24);
        }
    }

part("input", density = STEEL)
    color("indianred") translate(A) wheel(N_IN, 8);
hinge("input_shaft", parts = ["input", "frame"], at = A, axis = [0, 0, 1]);
drive("input_shaft", speed = 180, torque = 90000);

// One part, two wheels, one shaft. The small one overlaps the big one by 0.4
// rather than sitting exactly on top of it: two solids whose faces are exactly
// coplanar and exactly touching are the worst case an exact boolean kernel has,
// and here it is free to avoid.
OVERLAP = 0.4;
part("compound", density = STEEL)
    color("steelblue") translate(B) {
        wheel(N_BIG, 8, PH_C);
        translate([0, 0, 8 - OVERLAP]) wheel(N_SMALL, 8 + OVERLAP, PH_C);
    }
hinge("layshaft", parts = ["compound", "frame"], at = B, axis = [0, 0, 1]);

part("output", density = STEEL)
    color("olivedrab") translate([C[0], C[1], C[2] + 8]) wheel(N_OUT, 8, PH_OUT);
hinge("output_shaft", parts = ["output", "frame"], at = C, axis = [0, 0, 1]);

// Negative because external gears counter-rotate, and equal to the tooth counts
// because that is what a gear ratio *is*. Both together are +7.5, so the output
// turns the same way as the input and a seven-and-a-half-th as fast.
gear("stage_one", parts = ["input", "compound"],
     at = [A[0] + pitch_r(N_IN), 40, DECK + 4], axis = [0, 0, 1],
     ratio = -N_BIG / N_IN);
gear("stage_two", parts = ["compound", "output"],
     at = [B[0] + pitch_r(N_SMALL), 40, DECK + 12], axis = [0, 0, 1],
     ratio = -N_OUT / N_SMALL);
